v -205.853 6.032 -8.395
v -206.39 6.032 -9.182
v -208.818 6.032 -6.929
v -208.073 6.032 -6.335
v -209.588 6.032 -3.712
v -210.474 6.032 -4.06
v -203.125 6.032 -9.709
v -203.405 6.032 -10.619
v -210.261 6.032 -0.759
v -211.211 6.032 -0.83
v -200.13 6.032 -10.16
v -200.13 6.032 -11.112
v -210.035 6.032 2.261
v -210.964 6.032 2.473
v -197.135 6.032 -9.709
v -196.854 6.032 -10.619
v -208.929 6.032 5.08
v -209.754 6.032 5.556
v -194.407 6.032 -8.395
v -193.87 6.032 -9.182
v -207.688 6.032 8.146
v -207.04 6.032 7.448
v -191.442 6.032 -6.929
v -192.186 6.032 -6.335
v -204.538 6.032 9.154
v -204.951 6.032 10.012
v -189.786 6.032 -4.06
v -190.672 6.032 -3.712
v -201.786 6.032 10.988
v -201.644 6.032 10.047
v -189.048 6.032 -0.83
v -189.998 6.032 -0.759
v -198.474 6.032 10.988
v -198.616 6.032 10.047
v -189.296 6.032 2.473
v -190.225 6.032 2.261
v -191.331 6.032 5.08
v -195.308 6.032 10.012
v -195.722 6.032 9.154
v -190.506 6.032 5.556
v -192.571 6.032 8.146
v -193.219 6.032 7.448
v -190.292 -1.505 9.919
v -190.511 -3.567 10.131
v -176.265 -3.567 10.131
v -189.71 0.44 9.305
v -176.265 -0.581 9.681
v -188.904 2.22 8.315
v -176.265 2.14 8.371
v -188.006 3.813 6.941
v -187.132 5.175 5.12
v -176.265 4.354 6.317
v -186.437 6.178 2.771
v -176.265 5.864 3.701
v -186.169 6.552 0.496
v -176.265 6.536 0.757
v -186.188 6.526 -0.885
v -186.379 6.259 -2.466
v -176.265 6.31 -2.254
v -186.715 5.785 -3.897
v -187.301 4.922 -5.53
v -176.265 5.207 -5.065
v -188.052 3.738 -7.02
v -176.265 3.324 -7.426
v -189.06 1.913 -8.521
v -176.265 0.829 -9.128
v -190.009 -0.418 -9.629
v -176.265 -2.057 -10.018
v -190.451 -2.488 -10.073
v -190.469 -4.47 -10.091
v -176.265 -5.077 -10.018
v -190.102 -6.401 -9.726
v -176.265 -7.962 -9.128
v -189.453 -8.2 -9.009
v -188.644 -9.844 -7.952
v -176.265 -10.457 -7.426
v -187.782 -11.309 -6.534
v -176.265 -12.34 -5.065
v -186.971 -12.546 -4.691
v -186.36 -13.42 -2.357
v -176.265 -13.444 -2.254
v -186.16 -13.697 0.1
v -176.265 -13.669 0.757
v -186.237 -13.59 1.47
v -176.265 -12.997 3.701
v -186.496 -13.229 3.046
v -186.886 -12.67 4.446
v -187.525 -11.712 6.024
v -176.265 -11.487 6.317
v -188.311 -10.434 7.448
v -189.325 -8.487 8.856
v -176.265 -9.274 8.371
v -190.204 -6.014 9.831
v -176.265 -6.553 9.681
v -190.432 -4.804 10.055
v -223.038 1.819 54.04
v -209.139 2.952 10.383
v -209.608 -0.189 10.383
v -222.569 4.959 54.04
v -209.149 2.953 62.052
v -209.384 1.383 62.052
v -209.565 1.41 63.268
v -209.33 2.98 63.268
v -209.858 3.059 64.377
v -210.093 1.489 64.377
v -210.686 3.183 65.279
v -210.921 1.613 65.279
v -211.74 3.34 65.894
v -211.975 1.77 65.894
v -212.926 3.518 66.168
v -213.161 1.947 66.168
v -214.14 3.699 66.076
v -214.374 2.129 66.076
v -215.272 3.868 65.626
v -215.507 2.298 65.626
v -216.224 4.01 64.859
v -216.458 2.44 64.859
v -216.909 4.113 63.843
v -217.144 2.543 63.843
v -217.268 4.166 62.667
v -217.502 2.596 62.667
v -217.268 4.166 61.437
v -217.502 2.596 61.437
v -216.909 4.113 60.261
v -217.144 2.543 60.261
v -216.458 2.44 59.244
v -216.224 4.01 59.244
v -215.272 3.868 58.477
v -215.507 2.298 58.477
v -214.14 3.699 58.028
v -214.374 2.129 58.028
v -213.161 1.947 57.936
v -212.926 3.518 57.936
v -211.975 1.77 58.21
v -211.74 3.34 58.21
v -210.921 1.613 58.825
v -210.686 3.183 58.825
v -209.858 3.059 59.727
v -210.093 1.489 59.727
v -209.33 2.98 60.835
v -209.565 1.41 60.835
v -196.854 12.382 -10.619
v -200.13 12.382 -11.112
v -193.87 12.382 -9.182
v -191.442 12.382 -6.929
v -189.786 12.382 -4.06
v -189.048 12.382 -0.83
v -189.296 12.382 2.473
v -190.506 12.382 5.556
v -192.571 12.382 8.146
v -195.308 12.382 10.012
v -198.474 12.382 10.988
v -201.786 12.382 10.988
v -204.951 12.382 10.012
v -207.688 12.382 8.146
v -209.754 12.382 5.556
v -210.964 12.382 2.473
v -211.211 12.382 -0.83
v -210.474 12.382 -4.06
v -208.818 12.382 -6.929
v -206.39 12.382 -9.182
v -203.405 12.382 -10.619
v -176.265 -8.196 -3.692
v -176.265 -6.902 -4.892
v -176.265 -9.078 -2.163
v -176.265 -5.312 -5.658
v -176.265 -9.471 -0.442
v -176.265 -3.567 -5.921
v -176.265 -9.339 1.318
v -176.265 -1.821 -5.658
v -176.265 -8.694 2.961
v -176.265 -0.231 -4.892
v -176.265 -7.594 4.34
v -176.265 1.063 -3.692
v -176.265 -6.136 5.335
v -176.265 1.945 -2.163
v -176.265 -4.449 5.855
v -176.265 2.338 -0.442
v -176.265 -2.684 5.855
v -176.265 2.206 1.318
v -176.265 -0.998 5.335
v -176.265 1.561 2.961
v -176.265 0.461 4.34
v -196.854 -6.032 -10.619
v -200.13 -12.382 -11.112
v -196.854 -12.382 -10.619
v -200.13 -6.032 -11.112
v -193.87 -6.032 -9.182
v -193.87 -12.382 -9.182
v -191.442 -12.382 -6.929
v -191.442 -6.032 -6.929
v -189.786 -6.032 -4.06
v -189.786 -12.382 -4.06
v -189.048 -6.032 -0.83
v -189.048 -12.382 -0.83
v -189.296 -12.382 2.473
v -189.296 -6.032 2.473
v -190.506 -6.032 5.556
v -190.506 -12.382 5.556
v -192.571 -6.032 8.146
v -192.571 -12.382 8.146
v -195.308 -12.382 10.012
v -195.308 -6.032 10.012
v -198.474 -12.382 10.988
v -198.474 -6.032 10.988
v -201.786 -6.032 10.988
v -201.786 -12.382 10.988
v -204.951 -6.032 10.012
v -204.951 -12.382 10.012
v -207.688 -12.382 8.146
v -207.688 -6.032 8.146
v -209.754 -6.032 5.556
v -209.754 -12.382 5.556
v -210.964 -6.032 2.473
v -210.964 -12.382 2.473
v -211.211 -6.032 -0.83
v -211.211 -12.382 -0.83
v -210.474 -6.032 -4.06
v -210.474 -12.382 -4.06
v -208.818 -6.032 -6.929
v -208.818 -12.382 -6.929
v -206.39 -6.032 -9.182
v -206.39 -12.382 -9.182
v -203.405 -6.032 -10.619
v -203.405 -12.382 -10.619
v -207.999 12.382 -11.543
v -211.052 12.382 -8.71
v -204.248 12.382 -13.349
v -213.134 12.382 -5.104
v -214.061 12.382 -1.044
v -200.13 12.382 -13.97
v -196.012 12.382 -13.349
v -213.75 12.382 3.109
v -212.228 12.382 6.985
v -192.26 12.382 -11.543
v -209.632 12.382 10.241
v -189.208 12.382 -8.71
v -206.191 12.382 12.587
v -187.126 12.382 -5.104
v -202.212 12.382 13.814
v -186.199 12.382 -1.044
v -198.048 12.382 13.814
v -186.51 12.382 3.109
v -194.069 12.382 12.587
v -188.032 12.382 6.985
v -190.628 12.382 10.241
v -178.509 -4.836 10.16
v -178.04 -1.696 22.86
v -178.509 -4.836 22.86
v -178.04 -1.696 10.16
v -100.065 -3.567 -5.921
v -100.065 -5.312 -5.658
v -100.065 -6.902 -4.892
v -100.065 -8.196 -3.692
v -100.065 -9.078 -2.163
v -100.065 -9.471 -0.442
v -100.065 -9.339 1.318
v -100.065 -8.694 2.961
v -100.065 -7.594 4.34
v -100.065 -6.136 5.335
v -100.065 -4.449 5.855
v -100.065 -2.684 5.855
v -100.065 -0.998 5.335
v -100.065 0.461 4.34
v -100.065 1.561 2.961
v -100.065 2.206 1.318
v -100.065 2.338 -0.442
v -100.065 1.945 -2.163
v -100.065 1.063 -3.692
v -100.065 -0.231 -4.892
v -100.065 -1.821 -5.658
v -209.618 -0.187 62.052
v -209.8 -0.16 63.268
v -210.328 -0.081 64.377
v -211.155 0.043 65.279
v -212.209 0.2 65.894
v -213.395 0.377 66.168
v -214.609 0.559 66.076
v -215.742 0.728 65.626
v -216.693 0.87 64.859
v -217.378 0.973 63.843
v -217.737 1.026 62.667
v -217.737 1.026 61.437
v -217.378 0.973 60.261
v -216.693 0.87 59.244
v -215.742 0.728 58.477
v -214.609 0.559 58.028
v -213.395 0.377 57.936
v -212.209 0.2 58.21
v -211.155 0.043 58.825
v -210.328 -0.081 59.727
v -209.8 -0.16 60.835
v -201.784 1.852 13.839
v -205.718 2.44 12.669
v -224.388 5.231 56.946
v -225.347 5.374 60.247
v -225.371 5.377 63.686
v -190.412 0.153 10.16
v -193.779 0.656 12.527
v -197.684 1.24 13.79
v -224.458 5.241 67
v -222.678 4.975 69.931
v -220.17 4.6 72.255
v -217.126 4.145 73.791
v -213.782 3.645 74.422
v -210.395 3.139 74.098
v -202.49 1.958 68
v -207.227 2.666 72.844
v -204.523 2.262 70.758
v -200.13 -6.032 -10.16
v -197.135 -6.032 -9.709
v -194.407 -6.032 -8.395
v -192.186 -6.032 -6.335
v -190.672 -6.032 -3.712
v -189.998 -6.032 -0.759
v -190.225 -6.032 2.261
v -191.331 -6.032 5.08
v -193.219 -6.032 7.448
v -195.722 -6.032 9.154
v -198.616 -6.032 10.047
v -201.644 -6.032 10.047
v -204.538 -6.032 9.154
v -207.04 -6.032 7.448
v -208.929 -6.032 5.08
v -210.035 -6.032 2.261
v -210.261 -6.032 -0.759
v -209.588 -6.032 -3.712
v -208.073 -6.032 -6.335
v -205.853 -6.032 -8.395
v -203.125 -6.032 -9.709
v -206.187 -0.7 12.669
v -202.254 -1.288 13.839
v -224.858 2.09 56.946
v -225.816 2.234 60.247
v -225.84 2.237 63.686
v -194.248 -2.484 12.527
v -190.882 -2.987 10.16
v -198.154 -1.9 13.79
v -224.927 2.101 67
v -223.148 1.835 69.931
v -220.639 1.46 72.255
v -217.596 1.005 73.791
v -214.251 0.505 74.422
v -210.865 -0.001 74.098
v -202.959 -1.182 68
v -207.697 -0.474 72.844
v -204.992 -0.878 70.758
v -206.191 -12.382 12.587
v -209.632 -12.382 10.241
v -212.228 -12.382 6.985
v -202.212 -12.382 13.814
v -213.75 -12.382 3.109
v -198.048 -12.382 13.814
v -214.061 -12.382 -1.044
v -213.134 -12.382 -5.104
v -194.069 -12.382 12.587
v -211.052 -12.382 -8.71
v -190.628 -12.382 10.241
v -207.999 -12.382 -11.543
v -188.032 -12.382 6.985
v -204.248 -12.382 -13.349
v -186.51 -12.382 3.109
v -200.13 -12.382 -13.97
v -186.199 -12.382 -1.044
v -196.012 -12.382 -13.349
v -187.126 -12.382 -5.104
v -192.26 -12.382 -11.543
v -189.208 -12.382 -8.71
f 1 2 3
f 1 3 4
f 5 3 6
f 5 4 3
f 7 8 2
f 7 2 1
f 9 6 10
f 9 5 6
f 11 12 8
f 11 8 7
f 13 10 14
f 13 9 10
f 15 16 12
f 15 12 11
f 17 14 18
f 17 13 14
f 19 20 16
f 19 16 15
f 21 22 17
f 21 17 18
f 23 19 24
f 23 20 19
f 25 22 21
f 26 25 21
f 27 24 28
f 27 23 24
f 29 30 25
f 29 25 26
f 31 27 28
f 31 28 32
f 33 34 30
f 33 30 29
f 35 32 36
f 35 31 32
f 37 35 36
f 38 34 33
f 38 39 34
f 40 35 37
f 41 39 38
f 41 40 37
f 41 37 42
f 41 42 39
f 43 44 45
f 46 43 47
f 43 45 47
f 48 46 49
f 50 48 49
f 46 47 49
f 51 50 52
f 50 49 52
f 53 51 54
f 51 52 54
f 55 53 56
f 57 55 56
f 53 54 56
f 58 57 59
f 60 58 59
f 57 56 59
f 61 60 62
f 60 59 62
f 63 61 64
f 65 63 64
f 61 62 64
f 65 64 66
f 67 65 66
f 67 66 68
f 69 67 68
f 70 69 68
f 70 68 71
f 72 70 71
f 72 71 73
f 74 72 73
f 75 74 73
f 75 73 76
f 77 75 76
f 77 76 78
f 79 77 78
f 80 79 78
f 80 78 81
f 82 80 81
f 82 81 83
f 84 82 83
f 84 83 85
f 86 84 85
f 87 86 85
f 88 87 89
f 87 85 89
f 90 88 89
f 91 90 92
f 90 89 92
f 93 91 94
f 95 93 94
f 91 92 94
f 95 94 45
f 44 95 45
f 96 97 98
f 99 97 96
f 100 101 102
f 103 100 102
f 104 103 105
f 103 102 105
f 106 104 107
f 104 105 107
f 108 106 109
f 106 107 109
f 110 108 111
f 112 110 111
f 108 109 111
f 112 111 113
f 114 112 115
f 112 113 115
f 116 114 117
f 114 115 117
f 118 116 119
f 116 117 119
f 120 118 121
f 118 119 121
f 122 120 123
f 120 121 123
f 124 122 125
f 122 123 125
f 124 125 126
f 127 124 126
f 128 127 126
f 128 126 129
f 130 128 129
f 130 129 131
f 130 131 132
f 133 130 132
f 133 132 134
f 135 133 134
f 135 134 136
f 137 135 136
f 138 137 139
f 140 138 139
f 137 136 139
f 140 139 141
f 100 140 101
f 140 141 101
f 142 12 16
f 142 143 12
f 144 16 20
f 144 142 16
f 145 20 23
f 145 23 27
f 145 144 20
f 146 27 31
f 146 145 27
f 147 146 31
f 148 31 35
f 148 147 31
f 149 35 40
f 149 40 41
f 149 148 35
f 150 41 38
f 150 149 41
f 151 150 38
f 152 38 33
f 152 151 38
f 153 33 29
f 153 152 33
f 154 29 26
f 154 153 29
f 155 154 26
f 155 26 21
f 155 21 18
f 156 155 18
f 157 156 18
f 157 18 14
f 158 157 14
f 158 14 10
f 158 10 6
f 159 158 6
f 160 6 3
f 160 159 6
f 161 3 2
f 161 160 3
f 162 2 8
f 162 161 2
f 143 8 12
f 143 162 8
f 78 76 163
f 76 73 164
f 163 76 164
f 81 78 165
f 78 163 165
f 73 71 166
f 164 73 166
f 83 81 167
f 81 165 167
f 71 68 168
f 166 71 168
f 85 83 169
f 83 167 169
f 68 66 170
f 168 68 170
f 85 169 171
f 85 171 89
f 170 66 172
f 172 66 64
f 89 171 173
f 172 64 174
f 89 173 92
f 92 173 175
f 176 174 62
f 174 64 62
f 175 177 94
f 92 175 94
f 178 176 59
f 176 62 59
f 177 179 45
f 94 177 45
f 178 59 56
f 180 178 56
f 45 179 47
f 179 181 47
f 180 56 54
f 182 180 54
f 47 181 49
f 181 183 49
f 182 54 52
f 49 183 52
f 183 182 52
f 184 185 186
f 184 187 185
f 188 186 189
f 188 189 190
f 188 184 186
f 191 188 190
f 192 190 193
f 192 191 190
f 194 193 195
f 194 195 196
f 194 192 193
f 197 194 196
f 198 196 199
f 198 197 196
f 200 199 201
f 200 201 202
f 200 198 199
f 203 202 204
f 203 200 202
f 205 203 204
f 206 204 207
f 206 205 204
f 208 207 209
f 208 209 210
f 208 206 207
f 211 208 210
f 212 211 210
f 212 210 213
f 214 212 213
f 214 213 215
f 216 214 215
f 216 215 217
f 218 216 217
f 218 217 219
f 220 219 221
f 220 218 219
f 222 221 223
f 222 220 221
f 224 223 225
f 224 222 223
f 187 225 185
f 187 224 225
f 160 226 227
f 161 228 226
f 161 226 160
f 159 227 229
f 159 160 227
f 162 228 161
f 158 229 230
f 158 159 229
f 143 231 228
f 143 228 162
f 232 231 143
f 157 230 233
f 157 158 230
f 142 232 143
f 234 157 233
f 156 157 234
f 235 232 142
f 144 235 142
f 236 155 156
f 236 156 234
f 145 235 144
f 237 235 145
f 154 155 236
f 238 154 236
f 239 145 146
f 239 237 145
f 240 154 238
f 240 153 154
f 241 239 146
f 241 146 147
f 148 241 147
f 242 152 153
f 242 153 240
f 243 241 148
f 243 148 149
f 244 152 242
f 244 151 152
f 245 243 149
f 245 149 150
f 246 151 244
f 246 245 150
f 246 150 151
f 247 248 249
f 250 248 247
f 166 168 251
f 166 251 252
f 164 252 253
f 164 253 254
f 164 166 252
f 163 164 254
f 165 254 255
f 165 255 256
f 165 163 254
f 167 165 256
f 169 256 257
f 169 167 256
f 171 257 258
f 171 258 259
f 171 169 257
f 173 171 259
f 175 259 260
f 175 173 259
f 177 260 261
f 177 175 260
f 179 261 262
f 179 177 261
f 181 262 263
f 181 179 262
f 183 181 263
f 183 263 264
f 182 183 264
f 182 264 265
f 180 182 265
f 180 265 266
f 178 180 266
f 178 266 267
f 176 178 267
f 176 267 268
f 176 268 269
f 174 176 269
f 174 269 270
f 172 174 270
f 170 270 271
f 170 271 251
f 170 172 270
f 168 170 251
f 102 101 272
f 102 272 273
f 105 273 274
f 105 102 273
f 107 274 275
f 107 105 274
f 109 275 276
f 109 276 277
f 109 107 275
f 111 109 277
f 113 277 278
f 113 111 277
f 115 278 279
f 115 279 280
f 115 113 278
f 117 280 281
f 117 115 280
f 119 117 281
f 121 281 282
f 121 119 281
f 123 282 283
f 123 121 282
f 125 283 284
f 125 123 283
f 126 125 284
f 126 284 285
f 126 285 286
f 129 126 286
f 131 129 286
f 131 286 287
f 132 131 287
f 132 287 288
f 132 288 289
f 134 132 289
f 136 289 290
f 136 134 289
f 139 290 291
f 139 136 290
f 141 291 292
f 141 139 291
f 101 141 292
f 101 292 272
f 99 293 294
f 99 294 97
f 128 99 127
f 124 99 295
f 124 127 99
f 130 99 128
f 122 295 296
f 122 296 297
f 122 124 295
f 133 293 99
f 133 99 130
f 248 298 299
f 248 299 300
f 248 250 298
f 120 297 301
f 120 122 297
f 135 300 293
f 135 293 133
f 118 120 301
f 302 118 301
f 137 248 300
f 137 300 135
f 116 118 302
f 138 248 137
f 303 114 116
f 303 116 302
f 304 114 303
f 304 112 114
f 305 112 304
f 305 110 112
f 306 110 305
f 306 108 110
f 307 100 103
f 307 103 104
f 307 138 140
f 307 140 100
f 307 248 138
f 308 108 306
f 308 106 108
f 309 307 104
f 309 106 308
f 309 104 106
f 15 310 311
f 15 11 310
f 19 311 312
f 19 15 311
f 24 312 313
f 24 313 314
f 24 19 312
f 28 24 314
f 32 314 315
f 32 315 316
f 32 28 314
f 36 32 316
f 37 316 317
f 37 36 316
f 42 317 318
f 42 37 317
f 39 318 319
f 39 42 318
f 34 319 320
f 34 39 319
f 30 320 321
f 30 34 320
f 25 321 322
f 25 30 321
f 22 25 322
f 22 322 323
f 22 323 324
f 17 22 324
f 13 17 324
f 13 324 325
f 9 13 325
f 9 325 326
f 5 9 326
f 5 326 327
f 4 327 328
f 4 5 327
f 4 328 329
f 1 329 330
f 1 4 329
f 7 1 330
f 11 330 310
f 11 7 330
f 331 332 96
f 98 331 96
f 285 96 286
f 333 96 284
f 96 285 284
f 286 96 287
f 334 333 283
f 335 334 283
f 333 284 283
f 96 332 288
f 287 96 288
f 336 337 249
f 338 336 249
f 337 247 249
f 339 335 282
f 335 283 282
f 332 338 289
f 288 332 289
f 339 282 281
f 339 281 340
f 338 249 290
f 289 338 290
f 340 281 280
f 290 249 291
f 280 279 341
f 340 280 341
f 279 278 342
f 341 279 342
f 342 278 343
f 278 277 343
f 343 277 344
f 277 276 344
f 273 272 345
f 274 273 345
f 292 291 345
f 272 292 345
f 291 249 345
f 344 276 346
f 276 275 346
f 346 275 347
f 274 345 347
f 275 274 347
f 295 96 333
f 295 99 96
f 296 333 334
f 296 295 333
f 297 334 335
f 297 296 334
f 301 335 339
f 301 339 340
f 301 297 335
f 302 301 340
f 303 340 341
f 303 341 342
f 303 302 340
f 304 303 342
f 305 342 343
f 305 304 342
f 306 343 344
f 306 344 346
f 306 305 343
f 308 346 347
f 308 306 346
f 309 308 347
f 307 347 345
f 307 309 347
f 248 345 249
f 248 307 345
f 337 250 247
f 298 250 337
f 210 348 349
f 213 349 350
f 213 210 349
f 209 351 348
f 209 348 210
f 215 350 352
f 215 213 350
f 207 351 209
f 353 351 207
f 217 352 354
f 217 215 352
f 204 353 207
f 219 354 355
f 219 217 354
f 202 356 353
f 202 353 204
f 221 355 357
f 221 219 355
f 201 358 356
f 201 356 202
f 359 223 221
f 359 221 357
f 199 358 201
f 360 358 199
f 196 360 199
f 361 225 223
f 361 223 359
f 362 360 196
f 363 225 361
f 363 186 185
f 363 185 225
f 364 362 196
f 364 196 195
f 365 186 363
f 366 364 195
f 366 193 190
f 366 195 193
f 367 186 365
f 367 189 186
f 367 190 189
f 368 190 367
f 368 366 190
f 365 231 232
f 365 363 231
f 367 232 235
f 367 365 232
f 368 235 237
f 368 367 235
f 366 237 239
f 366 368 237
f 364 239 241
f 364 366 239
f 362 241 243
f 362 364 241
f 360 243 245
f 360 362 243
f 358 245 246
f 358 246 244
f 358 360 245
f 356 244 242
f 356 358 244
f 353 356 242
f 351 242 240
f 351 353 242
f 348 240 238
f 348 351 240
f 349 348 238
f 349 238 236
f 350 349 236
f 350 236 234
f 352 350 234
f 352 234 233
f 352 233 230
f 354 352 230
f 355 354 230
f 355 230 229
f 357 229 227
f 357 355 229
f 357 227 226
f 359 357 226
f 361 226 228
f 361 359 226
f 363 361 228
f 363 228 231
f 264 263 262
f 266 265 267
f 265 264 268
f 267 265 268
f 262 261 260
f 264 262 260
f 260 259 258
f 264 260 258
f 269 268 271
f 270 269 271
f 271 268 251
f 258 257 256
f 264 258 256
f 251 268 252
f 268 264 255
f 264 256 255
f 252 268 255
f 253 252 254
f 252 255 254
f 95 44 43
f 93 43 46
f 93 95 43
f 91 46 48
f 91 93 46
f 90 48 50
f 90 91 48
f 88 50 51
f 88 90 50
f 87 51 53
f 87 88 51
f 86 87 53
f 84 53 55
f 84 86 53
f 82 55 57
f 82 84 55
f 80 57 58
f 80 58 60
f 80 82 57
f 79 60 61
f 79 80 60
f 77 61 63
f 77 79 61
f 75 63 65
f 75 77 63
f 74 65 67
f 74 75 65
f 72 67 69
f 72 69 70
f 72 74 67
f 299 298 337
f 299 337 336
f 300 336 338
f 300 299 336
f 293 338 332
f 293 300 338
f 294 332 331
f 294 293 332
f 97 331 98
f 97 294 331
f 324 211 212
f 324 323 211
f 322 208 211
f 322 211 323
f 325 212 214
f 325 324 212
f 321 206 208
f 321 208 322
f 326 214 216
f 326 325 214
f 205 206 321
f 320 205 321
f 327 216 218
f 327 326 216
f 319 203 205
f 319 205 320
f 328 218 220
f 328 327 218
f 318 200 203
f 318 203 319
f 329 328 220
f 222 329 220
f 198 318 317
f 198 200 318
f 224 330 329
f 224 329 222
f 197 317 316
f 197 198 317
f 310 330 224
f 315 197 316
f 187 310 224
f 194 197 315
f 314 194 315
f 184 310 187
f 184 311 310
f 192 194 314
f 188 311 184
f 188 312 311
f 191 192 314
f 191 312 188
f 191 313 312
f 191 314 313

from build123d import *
from build123d.topology import SkipClean

# Parameters (mm, degrees)
BOSS_EXTRUDE2_DEPTH                  = 1.5875
BOSS_EXTRUDE2_DEPTH_BACK             = 1.5875
SKETCH4_R                            = 4.1275
SKETCH5_R                            = 10.130893735
BOSS_EXTRUDE3_DEPTH                  = 9.894952783
BOSS_EXTRUDE3_DIRECTION_2_REACH      = 87.304
BOSS_EXTRUDE3_DIRECTION_2_END_RADIUS = 13.97
SKETCH6_R                            = 5.921066373
BOSS_EXTRUDE4_DEPTH                  = 76.2
CUT_EXTRUDE1_DEPTH                   = 239.285873873
CUT_EXTRUDE1_DEPTH_BACK              = 239.285873873
SKETCH7_W                            = 149.643114042
SKETCH7_H                            = 170.238594894


with BuildPart() as part:
    # Sketch2 → Revolve1 (revolve)
    with BuildSketch(Plane.XY):
        Polygon((13.97, 12.3825), (13.97, -12.3825), (11.1125, -12.3825), (11.1125, -6.0325), (10.16, -6.0325), (10.16, 6.0325), (11.1125, 6.0325), (11.1125, 12.3825), align=None)
    revolve(axis=Axis((0, -12.3825, 0), (0, 1, 0)))


with BuildPart() as body_2:
    # Sketch4 → Boss-Extrude2 (new, two sides: drawn at the far end of the back side and taken through both)
    with BuildSketch(Plane(origin=(0, 0, 0), x_dir=(0, 0, -1), z_dir=(-0.14780941112961093, 0.9890158633619168, 0)).offset(-BOSS_EXTRUDE2_DEPTH_BACK)):
        with BuildLine():
            Line((-54.039928854, -22.925293076), (-10.382944015, -9.346409662))
            ThreePointArc((-10.382944015, -9.346409662), (-13.969031731, 0.164476444), (-10.16, 9.588289733))
            Line((-10.16, 9.588289733), (-10.16, 22.098))
            Line((-10.16, 22.098), (-22.86, 22.098))
            Line((-22.86, 22.098), (-67.999747489, -2.623704278))
            ThreePointArc((-67.999747489, -2.623704278), (-72.254940581, -20.500002013), (-54.039928854, -22.925293076))
        make_face()
        with Locations((-62.0518225, -13.484113782)):
            Circle(SKETCH4_R, mode=Mode.SUBTRACT)
    extrude(amount=BOSS_EXTRUDE2_DEPTH + BOSS_EXTRUDE2_DEPTH_BACK)


with BuildPart() as body_3:
    # Sketch5 → Boss-Extrude3 (new body)
    with BuildSketch(Plane.ZY.offset(13.97)):
        with Locations((0, -3.566641091)):
            Circle(SKETCH5_R)
    extrude(amount=BOSS_EXTRUDE3_DEPTH)

    # Boss-Extrude3 direction 2: up to this cylinder (the profile starts outside it)
    with SkipClean():  # the faces are left unmerged after this step: merging them gives an invalid solid
        boss_extrude3_direction_2_end = Plane(origin=(0, -3.566641, 0), z_dir=(0, -1, 0)) * Cylinder(BOSS_EXTRUDE3_DIRECTION_2_END_RADIUS, 203.548, mode=Mode.PRIVATE)
        # Sketch5 → Boss-Extrude3 direction 2 (add, up to the surface)
        with BuildSketch(Plane.ZY.offset(13.97), mode=Mode.PRIVATE) as boss_extrude3_direction_2_sk1:
            with Locations((0, -3.566641091)):
                Circle(SKETCH5_R)
        boss_extrude3_direction_2_tool1 = extrude(boss_extrude3_direction_2_sk1.sketch, amount=-BOSS_EXTRUDE3_DIRECTION_2_REACH, mode=Mode.PRIVATE) - boss_extrude3_direction_2_end
        add(boss_extrude3_direction_2_tool1.solids().sort_by_distance((-13.97, -3.566641, 0))[0])
        add(boss_extrude3_direction_2_tool1.solids().sort_by_distance((-13.97, -3.566641, 0))[1])

    # Sketch6 → Boss-Extrude4 (add)
    with BuildSketch(Plane.ZY.offset(23.864952783)):
        with Locations((0, -3.566641091)):
            Circle(SKETCH6_R)
    extrude(amount=BOSS_EXTRUDE4_DEPTH)


with BuildPart() as body_4:
    # Mirror1: mirrored copy
    add(body_2.part.mirror(Plane(origin=(-100.064952783, -3.566641091, 0), x_dir=(0, 0, 1), z_dir=(-1, 0, 0))))


with BuildPart() as body_5:
    # Mirror1 2: mirrored copy
    add(body_3.part.mirror(Plane(origin=(-100.064952783, -3.566641091, 0), x_dir=(0, 0, 1), z_dir=(-1, 0, 0))))


with BuildPart() as body_6:
    # Mirror1 3: mirrored copy
    add(part.part.mirror(Plane(origin=(-100.064952783, -3.566641091, 0), x_dir=(0, 0, 1), z_dir=(-1, 0, 0))))


with BuildPart() as cut_extrude1_tool:
    # Sketch7 → Cut-Extrude1 (new, two sides: drawn at the far end of the back side and taken through both)
    with BuildSketch(Plane(origin=(0, 0, 0), x_dir=(1, 0, 0), z_dir=(0, 1, 0)).offset(-CUT_EXTRUDE1_DEPTH_BACK)):
        with Locations((-25.243395762, -25.539520043)):
            Rectangle(SKETCH7_W, SKETCH7_H)
    extrude(amount=CUT_EXTRUDE1_DEPTH + CUT_EXTRUDE1_DEPTH_BACK)


with BuildPart() as part_1:
    add(part.part)

    # Cut-Extrude1: cut by cut_extrude1_tool
    add(cut_extrude1_tool.part, mode=Mode.SUBTRACT)


with BuildPart() as body_2_1:
    add(body_2.part)

    # Cut-Extrude1: cut by cut_extrude1_tool
    add(cut_extrude1_tool.part, mode=Mode.SUBTRACT)


with BuildPart() as body_3_1:
    add(body_3.part)

    # Cut-Extrude1: cut by cut_extrude1_tool
    add(cut_extrude1_tool.part, mode=Mode.SUBTRACT)


solid = Compound([body_4.part, body_5.part, body_6.part])
